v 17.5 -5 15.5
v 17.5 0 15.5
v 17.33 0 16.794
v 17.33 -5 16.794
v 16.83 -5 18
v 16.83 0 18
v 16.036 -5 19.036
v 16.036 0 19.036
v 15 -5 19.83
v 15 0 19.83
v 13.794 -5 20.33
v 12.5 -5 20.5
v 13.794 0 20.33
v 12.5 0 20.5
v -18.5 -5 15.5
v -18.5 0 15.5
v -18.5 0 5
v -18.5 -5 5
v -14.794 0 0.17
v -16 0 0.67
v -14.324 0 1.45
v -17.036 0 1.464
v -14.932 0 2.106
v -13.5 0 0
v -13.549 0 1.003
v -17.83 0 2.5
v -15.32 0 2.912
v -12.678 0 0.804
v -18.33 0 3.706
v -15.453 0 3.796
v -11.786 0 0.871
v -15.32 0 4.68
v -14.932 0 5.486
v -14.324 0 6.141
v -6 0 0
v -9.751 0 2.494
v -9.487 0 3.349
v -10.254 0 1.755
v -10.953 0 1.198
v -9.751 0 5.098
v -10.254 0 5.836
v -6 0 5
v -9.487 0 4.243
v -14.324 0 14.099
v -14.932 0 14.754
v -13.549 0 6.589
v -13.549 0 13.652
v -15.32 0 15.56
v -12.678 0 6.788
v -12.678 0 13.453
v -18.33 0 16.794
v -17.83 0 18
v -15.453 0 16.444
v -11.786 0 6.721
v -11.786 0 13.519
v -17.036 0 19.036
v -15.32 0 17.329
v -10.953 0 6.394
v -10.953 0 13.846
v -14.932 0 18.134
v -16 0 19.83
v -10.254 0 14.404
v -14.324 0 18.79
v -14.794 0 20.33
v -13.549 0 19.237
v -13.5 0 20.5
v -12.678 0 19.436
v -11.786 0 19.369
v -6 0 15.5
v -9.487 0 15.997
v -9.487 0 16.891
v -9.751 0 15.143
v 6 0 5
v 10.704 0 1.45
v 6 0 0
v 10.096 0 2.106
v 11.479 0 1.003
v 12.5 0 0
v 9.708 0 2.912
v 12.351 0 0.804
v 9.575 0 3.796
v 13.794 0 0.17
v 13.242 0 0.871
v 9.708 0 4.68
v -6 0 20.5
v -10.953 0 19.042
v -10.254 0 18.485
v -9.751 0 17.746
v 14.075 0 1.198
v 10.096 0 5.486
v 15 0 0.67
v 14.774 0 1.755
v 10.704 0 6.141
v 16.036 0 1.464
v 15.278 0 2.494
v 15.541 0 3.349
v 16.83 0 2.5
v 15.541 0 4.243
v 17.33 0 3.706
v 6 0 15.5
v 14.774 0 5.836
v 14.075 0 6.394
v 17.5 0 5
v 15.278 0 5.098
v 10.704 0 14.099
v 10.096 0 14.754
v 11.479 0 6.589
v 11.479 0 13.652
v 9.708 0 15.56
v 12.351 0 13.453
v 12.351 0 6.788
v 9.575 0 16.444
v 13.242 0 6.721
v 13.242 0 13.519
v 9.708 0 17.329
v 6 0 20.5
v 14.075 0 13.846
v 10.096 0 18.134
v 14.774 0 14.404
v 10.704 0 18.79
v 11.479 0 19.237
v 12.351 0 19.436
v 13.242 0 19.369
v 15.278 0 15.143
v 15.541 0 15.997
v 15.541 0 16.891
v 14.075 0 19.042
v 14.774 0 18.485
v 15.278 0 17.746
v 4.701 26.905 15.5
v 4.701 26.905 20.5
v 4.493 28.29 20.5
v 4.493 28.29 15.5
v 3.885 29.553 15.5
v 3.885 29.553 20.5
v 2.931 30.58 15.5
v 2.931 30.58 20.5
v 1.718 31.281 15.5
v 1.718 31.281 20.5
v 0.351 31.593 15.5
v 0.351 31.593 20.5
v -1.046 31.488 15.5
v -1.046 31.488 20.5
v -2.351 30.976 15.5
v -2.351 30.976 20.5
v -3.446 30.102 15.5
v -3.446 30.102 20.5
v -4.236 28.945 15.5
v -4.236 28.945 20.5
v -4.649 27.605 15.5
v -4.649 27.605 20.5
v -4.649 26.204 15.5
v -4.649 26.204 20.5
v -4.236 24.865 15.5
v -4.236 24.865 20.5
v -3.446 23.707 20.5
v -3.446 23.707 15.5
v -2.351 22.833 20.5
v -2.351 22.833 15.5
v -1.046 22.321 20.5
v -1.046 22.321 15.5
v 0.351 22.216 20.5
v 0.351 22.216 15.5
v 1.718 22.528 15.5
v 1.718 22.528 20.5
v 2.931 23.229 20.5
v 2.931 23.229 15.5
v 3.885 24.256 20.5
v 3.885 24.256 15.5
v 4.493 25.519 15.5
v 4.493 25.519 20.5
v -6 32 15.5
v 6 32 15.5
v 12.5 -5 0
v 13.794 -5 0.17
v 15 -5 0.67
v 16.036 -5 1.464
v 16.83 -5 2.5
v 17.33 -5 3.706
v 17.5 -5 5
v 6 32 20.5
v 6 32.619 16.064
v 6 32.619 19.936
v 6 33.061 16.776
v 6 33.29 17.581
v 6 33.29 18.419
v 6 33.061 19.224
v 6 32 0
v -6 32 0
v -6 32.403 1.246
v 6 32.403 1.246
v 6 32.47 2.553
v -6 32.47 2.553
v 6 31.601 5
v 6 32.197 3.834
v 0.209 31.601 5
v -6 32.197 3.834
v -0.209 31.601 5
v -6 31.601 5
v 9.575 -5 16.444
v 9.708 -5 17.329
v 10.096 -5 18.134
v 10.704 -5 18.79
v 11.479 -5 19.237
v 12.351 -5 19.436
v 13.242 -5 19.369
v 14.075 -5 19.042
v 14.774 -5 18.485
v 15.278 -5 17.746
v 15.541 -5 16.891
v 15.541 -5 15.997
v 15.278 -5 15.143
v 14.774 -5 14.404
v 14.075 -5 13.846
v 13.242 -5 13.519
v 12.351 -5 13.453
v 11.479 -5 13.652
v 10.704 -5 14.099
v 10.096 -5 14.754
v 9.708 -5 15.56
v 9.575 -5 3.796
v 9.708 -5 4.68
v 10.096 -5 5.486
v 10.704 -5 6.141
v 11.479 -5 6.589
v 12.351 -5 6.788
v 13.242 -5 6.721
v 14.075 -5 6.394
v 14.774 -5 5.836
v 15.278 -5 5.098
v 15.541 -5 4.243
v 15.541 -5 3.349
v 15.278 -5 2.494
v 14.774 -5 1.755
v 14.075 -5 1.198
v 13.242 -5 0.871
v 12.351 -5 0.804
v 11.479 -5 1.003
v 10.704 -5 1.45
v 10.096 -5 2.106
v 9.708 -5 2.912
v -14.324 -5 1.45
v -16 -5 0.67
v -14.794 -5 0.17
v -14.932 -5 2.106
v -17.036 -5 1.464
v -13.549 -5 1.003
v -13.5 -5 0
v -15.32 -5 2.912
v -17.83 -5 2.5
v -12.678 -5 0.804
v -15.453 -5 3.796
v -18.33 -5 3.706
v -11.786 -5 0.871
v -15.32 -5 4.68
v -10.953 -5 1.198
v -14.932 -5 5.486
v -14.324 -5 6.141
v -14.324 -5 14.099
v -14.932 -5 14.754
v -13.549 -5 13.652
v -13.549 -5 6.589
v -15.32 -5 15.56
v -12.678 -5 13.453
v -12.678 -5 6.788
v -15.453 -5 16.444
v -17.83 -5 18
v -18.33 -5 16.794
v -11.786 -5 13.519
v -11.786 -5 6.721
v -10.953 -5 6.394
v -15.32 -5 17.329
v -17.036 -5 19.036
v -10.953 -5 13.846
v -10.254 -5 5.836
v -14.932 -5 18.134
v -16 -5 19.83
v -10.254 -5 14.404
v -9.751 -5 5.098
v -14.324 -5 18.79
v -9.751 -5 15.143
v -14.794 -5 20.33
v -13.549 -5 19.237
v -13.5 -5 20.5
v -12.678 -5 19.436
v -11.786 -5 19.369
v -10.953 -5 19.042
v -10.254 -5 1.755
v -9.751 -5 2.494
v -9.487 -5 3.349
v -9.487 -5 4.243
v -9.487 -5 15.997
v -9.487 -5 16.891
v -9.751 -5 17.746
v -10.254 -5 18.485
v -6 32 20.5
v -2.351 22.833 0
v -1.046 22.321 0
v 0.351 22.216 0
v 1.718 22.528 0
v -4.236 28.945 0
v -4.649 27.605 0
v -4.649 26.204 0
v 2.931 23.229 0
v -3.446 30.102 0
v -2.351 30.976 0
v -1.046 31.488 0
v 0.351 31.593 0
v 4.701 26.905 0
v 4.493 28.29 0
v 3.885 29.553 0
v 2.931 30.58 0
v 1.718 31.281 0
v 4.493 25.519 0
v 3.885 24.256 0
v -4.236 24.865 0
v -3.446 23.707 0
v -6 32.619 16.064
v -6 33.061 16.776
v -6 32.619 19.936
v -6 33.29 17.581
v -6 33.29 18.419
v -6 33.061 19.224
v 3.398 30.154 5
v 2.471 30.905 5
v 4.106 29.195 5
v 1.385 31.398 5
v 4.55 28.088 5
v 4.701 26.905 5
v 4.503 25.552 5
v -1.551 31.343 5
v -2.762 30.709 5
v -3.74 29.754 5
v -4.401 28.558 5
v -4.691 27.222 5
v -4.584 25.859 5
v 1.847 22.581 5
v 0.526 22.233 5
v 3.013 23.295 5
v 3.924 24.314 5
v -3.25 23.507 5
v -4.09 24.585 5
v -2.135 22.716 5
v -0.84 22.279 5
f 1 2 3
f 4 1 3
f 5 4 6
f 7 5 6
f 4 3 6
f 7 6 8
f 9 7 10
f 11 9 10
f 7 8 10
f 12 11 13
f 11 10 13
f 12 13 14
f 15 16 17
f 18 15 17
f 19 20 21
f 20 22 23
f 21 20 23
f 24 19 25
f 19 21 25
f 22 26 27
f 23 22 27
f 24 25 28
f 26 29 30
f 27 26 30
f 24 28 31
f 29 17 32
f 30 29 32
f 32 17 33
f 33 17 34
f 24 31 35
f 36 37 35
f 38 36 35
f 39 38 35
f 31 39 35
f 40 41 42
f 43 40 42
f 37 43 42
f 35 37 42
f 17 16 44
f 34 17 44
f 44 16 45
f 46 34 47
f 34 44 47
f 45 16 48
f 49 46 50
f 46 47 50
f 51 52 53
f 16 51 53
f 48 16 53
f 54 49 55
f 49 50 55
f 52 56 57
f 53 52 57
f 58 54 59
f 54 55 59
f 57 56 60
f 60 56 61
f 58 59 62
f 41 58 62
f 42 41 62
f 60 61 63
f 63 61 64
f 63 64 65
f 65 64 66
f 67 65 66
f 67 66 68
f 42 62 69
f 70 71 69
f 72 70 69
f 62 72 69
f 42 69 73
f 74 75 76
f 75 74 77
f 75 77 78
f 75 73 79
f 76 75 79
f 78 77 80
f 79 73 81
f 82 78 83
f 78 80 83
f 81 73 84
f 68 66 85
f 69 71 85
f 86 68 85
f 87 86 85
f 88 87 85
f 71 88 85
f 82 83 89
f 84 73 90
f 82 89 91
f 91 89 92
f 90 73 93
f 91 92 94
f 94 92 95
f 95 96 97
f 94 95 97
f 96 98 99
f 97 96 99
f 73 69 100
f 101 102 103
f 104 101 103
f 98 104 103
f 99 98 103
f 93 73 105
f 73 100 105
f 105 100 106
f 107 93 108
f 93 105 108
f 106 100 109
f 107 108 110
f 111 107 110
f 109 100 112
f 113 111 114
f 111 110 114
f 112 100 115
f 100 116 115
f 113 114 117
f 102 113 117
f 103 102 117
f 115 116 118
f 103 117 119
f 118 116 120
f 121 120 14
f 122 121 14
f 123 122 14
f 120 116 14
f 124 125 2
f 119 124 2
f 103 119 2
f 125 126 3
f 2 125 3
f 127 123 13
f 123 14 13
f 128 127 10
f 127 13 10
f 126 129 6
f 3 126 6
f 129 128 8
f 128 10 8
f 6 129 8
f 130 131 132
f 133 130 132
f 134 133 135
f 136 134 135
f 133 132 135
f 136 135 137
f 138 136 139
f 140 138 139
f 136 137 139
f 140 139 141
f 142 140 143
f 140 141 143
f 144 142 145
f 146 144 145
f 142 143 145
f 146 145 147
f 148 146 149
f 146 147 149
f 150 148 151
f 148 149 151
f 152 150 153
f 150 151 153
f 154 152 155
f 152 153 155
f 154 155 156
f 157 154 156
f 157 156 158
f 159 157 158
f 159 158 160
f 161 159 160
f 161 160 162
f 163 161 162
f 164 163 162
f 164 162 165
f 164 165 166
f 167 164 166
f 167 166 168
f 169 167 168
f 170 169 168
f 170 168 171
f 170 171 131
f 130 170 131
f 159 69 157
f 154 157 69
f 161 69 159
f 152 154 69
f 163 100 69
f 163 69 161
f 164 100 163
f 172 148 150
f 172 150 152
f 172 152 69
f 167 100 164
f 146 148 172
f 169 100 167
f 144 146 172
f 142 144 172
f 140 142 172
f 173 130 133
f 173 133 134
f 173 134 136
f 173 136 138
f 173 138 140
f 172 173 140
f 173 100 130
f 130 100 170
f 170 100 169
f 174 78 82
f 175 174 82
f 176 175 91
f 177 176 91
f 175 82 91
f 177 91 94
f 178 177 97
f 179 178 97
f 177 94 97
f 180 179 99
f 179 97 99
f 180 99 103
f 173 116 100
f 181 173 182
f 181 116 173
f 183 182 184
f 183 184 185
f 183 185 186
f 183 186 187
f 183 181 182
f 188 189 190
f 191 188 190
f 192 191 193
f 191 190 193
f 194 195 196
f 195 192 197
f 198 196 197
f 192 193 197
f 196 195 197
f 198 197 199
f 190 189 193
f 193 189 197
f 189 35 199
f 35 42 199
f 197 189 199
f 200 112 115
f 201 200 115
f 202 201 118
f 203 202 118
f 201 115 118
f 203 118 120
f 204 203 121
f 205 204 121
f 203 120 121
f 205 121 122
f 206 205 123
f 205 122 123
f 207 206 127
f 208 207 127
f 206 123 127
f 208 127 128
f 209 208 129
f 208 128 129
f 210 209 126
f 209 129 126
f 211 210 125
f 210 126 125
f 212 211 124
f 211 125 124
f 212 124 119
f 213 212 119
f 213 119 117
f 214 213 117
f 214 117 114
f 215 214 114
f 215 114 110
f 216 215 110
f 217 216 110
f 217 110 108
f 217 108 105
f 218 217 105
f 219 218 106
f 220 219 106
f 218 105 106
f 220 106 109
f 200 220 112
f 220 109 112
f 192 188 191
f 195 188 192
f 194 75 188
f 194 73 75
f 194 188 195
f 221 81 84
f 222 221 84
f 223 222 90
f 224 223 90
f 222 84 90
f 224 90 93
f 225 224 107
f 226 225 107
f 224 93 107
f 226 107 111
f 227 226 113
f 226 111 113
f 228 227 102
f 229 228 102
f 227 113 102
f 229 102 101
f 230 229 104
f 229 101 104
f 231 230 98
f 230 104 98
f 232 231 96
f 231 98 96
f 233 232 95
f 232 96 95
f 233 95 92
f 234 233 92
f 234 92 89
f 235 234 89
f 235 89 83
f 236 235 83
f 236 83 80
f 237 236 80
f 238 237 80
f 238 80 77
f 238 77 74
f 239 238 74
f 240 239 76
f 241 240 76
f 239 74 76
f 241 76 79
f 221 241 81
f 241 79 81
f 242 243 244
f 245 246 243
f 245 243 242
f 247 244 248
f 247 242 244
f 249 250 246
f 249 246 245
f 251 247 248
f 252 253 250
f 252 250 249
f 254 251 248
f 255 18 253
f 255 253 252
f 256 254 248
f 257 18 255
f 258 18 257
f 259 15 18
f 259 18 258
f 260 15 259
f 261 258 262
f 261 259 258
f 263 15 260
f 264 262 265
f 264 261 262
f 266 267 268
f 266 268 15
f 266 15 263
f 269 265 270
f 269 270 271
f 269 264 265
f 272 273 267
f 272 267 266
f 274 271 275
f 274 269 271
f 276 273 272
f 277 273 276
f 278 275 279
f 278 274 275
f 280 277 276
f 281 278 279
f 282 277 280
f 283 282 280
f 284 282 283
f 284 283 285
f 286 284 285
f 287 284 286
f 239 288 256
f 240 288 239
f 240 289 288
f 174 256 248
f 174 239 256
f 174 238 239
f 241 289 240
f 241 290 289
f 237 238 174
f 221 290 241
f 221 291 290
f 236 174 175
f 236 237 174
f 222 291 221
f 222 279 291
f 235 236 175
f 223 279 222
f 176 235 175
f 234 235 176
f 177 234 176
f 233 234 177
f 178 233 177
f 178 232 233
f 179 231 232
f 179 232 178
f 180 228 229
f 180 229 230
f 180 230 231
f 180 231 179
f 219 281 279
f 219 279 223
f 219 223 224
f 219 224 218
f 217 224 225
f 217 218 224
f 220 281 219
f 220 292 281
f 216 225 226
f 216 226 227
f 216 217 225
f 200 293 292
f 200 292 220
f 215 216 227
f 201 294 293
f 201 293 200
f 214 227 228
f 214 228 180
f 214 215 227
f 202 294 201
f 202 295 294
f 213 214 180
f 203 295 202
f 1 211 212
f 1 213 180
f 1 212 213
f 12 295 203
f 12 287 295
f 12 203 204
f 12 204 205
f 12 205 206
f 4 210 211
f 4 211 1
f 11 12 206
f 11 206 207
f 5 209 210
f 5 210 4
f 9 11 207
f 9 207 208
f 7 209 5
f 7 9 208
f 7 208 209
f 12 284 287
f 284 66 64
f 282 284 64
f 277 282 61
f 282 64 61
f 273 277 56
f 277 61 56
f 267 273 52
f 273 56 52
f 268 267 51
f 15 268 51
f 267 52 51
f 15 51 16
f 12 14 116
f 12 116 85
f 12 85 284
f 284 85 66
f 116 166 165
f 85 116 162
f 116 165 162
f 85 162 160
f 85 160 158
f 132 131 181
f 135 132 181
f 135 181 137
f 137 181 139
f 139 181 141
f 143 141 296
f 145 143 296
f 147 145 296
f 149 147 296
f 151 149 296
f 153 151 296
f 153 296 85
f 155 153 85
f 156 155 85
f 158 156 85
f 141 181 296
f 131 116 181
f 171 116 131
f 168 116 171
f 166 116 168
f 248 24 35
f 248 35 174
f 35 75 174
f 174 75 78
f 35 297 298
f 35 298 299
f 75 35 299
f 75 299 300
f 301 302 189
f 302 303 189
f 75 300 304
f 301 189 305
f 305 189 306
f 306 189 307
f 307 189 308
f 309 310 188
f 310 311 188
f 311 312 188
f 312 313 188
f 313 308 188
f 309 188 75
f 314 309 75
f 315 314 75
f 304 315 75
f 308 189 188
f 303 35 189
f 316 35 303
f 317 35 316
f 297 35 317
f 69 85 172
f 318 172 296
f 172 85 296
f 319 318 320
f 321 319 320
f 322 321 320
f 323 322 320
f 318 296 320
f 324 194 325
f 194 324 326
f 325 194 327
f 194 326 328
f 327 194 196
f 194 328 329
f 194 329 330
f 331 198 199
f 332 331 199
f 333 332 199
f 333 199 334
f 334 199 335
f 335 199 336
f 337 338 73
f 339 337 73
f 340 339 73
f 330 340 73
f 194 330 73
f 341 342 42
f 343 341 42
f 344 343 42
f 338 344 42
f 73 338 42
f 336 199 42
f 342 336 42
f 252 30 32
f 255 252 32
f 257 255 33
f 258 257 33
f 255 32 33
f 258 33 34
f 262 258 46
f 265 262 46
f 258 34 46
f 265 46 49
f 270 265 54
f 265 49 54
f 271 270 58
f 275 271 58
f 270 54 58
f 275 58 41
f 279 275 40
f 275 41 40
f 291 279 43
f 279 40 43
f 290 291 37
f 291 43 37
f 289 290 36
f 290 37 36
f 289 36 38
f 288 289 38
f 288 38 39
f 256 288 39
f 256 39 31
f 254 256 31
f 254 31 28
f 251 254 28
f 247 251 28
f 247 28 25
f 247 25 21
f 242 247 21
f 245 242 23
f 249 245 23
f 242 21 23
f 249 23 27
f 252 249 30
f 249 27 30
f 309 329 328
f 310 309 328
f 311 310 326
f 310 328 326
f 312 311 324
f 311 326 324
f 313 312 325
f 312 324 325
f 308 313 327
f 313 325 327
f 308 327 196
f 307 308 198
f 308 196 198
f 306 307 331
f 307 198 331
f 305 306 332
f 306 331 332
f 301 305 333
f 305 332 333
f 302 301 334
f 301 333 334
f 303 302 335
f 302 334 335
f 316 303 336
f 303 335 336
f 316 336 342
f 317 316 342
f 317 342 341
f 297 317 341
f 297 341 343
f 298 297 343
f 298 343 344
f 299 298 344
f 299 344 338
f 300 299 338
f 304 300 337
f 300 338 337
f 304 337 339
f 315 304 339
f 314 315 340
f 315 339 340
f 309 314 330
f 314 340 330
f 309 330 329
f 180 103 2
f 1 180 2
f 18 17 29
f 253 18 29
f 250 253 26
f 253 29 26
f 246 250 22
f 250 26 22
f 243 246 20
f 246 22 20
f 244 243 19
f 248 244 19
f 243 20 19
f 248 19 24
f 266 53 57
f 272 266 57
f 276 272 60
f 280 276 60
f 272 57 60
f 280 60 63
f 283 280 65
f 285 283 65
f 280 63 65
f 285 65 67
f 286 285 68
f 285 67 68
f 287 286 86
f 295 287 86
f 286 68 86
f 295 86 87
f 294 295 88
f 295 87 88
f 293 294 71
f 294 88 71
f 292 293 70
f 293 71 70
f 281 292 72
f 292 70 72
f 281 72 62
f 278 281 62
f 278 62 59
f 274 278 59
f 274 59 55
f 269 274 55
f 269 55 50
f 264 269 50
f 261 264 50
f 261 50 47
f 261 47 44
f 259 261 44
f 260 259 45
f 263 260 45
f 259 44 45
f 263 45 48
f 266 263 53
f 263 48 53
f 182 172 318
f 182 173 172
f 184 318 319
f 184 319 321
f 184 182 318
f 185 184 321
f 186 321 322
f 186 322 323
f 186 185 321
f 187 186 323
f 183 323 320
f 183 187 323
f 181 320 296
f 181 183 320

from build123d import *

# Parameters (mm, degrees)
F1_DEPTH = 5
F3_DEPTH = 6
F4_R     = 3
F5_DEPTH = 5
F6_R     = 4.7014922297
F7_DEPTH = 25


# Not quite as in the source:
# - a feature names something its author has since deleted; it is built from what else it names


with BuildPart() as f1:
    # F0 (on Front) → F1 (new body)
    with BuildSketch(Plane.XZ):
        with BuildLine():
            Line((-13.5, 0), (0, 0))
            Line((0, 0), (12.5000002478, 0))
            ThreePointArc((12.5000002478, 0), (16.0355341537, 1.4644660941), (17.5000002478, 5))
            Line((17.5000002478, 5), (17.5000002478, 15.5))
            ThreePointArc((17.5000002478, 15.5), (16.0355341537, 19.0355339059), (12.5000002478, 20.5))
            Line((12.5000002478, 20.5), (0, 20.5))
            Line((0, 20.5), (-13.5, 20.5))
            ThreePointArc((-13.5, 20.5), (-17.0355339059, 19.0355339059), (-18.5, 15.5))
            Line((-18.5, 15.5), (-18.5, 5))
            ThreePointArc((-18.5, 5), (-17.0355339059, 1.4644660941), (-13.5, 0))
        make_face()
    extrude(amount=F1_DEPTH)

    # F2 (on Right) → F3 (join, symmetric)
    with BuildSketch(Plane.YZ):
        with BuildLine():
            Line((0, 4.0980060585), (0, 0))
            Line((0, 0), (32, 0))
            ThreePointArc((32, 0), (32.4704336179, 2.5533766687), (31.6014834029, 5))
            Line((31.6014834029, 5), (22.881918614, 5))
            Line((22.881918614, 5), (0, 5))
            Line((0, 5), (0, 4.0980060585))
        make_face()
        with BuildLine():
            Line((32, 20.5), (0, 20.5))
            Line((0, 20.5), (0, 15.5))
            Line((0, 15.5), (32, 15.5))
            ThreePointArc((32, 15.5), (33.3190218942, 18), (32, 20.5))
        make_face()
    extrude(amount=F3_DEPTH, both=True)

    # F4 (on face) → F5 (cut)
    with BuildSketch(Plane(origin=(0, 0, 0), x_dir=(-1, 0, 0), z_dir=(0, 1, 0))):
        with Locations((12.4534495048, 16.4442711417)):
            Circle(F4_R)
        with Locations((12.4534495048, 3.7959093649)):
            Circle(F4_R)
        with Locations((-12.5748278123, 16.4442711417)):
            Circle(F4_R)
        with Locations((-12.5748278123, 3.7959093649)):
            Circle(F4_R)
    extrude(amount=-F5_DEPTH, mode=Mode.SUBTRACT)

    # F6 (on face) → F7 (cut)
    with BuildSketch(Plane.XY.offset(20.5)):
        with Locations((0, 26.9046556205)):
            Circle(F6_R)
    extrude(amount=-F7_DEPTH, mode=Mode.SUBTRACT)


solid = f1.part
